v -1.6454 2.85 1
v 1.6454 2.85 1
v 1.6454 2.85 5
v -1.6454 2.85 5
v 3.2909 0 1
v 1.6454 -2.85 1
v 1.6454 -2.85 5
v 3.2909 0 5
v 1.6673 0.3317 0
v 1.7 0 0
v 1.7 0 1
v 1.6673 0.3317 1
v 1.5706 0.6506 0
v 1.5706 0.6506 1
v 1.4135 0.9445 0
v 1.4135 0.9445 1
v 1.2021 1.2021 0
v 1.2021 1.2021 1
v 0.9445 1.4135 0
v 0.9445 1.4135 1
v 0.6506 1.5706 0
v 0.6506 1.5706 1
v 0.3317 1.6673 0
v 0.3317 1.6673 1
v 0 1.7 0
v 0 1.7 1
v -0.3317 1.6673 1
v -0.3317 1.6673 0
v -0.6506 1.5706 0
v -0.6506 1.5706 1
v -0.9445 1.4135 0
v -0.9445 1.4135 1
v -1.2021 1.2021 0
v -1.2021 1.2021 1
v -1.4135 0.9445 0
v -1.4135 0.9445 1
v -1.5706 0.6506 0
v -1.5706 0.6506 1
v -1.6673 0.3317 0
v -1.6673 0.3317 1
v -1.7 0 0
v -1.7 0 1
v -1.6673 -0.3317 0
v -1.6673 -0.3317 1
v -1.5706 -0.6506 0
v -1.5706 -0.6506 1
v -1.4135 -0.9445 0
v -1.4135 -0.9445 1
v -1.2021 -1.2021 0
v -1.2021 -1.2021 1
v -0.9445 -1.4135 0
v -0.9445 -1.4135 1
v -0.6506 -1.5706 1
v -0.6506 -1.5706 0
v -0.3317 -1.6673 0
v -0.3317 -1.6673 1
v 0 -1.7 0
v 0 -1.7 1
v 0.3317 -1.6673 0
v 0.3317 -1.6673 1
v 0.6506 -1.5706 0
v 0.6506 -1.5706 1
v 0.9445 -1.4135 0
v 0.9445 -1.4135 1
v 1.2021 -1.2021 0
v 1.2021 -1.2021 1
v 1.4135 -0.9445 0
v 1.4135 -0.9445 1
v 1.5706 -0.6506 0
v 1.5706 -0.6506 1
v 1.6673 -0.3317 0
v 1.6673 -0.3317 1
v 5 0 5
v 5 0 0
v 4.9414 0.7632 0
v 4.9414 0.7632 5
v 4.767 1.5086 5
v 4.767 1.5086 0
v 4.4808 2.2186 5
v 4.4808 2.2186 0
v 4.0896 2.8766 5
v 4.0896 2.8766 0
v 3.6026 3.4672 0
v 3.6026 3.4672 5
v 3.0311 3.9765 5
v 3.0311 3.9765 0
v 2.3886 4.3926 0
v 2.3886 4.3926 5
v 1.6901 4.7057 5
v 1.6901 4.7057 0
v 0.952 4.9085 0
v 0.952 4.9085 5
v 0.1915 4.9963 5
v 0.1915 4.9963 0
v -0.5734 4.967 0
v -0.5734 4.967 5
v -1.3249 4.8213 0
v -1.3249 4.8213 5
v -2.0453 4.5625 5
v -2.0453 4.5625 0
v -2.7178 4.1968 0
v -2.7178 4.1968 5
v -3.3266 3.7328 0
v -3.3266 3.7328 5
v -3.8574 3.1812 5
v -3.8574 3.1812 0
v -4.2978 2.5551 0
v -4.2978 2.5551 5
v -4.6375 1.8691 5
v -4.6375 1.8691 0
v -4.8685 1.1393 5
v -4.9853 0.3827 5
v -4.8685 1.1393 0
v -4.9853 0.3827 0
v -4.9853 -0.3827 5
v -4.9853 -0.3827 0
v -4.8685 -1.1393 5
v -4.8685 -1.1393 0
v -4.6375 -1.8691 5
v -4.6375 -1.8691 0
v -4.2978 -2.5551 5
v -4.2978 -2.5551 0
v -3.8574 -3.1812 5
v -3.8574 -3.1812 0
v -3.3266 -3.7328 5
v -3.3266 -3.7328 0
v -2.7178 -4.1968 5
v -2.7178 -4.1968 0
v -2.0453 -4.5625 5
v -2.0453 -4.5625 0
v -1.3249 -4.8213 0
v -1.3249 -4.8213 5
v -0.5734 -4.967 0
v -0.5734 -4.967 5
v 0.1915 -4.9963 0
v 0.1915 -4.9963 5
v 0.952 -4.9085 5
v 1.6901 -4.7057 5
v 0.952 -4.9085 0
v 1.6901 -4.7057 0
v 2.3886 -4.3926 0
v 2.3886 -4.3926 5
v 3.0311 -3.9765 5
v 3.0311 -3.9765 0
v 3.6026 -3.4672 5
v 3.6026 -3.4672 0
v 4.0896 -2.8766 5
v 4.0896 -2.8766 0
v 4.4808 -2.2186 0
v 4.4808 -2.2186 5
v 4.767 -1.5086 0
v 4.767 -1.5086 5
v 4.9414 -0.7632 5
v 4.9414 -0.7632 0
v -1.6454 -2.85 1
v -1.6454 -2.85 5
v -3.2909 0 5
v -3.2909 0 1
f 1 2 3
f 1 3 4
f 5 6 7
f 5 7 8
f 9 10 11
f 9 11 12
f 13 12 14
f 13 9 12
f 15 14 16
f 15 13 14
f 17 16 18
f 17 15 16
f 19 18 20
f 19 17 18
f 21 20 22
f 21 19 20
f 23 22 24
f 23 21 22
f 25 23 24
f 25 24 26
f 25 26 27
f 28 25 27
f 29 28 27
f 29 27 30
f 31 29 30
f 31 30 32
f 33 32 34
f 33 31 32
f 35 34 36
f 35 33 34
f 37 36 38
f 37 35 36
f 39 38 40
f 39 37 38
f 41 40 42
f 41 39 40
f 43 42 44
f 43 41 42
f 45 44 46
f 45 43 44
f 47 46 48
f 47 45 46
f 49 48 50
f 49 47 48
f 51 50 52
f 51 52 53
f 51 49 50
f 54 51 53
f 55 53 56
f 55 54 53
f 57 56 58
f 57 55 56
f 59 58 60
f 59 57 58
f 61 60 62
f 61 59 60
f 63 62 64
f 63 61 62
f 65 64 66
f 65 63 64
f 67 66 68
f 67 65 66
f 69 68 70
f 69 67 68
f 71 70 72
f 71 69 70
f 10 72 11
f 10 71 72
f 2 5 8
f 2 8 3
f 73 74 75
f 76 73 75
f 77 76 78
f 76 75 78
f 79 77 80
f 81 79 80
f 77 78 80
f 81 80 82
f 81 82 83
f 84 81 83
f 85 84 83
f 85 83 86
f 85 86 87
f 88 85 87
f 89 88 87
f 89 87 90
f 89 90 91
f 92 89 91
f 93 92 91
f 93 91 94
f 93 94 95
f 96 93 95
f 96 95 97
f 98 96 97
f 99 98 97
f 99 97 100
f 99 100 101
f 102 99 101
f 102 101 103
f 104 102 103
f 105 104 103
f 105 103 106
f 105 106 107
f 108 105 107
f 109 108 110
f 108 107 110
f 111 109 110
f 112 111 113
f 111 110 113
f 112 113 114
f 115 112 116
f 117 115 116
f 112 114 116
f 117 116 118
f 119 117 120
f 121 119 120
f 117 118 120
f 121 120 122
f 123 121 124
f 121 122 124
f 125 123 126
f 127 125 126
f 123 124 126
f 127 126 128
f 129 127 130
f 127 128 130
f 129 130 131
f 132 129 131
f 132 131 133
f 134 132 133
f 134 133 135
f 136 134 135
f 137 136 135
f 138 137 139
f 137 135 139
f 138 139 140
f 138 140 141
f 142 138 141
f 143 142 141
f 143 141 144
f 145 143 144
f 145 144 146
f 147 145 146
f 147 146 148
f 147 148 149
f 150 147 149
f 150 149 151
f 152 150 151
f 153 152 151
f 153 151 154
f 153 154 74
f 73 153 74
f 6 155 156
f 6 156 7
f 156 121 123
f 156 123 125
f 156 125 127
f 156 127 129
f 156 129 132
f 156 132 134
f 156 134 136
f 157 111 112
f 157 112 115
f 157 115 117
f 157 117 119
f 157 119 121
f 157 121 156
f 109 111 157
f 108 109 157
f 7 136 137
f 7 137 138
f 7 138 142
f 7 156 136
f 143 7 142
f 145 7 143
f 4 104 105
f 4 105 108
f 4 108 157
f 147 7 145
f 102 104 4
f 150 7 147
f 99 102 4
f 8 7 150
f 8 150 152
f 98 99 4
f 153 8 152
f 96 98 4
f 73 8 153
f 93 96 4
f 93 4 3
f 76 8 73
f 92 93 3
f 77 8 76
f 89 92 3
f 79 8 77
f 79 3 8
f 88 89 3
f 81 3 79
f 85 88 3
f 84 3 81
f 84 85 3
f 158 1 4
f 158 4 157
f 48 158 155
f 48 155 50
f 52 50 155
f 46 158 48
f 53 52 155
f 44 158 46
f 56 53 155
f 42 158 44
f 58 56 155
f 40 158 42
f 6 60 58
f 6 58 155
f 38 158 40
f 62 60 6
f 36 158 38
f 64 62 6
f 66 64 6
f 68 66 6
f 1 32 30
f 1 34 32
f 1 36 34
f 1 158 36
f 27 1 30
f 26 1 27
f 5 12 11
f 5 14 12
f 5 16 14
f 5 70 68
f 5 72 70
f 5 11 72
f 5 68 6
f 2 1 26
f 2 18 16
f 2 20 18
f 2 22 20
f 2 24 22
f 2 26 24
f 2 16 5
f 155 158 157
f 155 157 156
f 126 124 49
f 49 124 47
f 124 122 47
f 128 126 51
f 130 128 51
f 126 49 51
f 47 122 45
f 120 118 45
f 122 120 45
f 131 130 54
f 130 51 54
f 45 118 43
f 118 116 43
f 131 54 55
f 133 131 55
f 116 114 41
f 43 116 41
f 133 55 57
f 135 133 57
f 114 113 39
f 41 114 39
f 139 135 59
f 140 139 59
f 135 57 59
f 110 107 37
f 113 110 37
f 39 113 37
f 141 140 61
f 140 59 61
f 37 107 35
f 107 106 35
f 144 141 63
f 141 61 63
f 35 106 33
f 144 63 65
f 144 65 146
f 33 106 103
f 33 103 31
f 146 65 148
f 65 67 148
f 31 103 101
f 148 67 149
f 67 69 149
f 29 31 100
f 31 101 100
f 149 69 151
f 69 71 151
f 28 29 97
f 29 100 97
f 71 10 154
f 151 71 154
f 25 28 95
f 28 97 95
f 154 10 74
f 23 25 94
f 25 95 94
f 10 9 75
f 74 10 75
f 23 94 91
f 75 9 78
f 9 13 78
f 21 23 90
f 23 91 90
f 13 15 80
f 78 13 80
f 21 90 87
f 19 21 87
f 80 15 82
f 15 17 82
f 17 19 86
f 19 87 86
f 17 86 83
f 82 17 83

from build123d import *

# Parameters (mm, degrees)
SKETCH_R      = 5
PAD_DEPTH     = 5
SKETCH001_R   = 5
SKETCH001_R_2 = 1.7
PAD001_DEPTH  = 1


with BuildPart() as part:
    # Sketch → Pad (new body)
    with BuildSketch(Plane.XY):
        Circle(SKETCH_R)
        Polygon((-3.290897, 0), (-1.645448, -2.85), (1.645448, -2.85), (3.290897, 0), (1.645448, 2.85), (-1.645448, 2.85), align=None, mode=Mode.SUBTRACT)
    extrude(amount=PAD_DEPTH)

    # Sketch001 → Pad001 (join)
    with BuildSketch(Plane.XY):
        Circle(SKETCH001_R)
        Circle(SKETCH001_R_2, mode=Mode.SUBTRACT)
    extrude(amount=PAD001_DEPTH)


solid = part.part
